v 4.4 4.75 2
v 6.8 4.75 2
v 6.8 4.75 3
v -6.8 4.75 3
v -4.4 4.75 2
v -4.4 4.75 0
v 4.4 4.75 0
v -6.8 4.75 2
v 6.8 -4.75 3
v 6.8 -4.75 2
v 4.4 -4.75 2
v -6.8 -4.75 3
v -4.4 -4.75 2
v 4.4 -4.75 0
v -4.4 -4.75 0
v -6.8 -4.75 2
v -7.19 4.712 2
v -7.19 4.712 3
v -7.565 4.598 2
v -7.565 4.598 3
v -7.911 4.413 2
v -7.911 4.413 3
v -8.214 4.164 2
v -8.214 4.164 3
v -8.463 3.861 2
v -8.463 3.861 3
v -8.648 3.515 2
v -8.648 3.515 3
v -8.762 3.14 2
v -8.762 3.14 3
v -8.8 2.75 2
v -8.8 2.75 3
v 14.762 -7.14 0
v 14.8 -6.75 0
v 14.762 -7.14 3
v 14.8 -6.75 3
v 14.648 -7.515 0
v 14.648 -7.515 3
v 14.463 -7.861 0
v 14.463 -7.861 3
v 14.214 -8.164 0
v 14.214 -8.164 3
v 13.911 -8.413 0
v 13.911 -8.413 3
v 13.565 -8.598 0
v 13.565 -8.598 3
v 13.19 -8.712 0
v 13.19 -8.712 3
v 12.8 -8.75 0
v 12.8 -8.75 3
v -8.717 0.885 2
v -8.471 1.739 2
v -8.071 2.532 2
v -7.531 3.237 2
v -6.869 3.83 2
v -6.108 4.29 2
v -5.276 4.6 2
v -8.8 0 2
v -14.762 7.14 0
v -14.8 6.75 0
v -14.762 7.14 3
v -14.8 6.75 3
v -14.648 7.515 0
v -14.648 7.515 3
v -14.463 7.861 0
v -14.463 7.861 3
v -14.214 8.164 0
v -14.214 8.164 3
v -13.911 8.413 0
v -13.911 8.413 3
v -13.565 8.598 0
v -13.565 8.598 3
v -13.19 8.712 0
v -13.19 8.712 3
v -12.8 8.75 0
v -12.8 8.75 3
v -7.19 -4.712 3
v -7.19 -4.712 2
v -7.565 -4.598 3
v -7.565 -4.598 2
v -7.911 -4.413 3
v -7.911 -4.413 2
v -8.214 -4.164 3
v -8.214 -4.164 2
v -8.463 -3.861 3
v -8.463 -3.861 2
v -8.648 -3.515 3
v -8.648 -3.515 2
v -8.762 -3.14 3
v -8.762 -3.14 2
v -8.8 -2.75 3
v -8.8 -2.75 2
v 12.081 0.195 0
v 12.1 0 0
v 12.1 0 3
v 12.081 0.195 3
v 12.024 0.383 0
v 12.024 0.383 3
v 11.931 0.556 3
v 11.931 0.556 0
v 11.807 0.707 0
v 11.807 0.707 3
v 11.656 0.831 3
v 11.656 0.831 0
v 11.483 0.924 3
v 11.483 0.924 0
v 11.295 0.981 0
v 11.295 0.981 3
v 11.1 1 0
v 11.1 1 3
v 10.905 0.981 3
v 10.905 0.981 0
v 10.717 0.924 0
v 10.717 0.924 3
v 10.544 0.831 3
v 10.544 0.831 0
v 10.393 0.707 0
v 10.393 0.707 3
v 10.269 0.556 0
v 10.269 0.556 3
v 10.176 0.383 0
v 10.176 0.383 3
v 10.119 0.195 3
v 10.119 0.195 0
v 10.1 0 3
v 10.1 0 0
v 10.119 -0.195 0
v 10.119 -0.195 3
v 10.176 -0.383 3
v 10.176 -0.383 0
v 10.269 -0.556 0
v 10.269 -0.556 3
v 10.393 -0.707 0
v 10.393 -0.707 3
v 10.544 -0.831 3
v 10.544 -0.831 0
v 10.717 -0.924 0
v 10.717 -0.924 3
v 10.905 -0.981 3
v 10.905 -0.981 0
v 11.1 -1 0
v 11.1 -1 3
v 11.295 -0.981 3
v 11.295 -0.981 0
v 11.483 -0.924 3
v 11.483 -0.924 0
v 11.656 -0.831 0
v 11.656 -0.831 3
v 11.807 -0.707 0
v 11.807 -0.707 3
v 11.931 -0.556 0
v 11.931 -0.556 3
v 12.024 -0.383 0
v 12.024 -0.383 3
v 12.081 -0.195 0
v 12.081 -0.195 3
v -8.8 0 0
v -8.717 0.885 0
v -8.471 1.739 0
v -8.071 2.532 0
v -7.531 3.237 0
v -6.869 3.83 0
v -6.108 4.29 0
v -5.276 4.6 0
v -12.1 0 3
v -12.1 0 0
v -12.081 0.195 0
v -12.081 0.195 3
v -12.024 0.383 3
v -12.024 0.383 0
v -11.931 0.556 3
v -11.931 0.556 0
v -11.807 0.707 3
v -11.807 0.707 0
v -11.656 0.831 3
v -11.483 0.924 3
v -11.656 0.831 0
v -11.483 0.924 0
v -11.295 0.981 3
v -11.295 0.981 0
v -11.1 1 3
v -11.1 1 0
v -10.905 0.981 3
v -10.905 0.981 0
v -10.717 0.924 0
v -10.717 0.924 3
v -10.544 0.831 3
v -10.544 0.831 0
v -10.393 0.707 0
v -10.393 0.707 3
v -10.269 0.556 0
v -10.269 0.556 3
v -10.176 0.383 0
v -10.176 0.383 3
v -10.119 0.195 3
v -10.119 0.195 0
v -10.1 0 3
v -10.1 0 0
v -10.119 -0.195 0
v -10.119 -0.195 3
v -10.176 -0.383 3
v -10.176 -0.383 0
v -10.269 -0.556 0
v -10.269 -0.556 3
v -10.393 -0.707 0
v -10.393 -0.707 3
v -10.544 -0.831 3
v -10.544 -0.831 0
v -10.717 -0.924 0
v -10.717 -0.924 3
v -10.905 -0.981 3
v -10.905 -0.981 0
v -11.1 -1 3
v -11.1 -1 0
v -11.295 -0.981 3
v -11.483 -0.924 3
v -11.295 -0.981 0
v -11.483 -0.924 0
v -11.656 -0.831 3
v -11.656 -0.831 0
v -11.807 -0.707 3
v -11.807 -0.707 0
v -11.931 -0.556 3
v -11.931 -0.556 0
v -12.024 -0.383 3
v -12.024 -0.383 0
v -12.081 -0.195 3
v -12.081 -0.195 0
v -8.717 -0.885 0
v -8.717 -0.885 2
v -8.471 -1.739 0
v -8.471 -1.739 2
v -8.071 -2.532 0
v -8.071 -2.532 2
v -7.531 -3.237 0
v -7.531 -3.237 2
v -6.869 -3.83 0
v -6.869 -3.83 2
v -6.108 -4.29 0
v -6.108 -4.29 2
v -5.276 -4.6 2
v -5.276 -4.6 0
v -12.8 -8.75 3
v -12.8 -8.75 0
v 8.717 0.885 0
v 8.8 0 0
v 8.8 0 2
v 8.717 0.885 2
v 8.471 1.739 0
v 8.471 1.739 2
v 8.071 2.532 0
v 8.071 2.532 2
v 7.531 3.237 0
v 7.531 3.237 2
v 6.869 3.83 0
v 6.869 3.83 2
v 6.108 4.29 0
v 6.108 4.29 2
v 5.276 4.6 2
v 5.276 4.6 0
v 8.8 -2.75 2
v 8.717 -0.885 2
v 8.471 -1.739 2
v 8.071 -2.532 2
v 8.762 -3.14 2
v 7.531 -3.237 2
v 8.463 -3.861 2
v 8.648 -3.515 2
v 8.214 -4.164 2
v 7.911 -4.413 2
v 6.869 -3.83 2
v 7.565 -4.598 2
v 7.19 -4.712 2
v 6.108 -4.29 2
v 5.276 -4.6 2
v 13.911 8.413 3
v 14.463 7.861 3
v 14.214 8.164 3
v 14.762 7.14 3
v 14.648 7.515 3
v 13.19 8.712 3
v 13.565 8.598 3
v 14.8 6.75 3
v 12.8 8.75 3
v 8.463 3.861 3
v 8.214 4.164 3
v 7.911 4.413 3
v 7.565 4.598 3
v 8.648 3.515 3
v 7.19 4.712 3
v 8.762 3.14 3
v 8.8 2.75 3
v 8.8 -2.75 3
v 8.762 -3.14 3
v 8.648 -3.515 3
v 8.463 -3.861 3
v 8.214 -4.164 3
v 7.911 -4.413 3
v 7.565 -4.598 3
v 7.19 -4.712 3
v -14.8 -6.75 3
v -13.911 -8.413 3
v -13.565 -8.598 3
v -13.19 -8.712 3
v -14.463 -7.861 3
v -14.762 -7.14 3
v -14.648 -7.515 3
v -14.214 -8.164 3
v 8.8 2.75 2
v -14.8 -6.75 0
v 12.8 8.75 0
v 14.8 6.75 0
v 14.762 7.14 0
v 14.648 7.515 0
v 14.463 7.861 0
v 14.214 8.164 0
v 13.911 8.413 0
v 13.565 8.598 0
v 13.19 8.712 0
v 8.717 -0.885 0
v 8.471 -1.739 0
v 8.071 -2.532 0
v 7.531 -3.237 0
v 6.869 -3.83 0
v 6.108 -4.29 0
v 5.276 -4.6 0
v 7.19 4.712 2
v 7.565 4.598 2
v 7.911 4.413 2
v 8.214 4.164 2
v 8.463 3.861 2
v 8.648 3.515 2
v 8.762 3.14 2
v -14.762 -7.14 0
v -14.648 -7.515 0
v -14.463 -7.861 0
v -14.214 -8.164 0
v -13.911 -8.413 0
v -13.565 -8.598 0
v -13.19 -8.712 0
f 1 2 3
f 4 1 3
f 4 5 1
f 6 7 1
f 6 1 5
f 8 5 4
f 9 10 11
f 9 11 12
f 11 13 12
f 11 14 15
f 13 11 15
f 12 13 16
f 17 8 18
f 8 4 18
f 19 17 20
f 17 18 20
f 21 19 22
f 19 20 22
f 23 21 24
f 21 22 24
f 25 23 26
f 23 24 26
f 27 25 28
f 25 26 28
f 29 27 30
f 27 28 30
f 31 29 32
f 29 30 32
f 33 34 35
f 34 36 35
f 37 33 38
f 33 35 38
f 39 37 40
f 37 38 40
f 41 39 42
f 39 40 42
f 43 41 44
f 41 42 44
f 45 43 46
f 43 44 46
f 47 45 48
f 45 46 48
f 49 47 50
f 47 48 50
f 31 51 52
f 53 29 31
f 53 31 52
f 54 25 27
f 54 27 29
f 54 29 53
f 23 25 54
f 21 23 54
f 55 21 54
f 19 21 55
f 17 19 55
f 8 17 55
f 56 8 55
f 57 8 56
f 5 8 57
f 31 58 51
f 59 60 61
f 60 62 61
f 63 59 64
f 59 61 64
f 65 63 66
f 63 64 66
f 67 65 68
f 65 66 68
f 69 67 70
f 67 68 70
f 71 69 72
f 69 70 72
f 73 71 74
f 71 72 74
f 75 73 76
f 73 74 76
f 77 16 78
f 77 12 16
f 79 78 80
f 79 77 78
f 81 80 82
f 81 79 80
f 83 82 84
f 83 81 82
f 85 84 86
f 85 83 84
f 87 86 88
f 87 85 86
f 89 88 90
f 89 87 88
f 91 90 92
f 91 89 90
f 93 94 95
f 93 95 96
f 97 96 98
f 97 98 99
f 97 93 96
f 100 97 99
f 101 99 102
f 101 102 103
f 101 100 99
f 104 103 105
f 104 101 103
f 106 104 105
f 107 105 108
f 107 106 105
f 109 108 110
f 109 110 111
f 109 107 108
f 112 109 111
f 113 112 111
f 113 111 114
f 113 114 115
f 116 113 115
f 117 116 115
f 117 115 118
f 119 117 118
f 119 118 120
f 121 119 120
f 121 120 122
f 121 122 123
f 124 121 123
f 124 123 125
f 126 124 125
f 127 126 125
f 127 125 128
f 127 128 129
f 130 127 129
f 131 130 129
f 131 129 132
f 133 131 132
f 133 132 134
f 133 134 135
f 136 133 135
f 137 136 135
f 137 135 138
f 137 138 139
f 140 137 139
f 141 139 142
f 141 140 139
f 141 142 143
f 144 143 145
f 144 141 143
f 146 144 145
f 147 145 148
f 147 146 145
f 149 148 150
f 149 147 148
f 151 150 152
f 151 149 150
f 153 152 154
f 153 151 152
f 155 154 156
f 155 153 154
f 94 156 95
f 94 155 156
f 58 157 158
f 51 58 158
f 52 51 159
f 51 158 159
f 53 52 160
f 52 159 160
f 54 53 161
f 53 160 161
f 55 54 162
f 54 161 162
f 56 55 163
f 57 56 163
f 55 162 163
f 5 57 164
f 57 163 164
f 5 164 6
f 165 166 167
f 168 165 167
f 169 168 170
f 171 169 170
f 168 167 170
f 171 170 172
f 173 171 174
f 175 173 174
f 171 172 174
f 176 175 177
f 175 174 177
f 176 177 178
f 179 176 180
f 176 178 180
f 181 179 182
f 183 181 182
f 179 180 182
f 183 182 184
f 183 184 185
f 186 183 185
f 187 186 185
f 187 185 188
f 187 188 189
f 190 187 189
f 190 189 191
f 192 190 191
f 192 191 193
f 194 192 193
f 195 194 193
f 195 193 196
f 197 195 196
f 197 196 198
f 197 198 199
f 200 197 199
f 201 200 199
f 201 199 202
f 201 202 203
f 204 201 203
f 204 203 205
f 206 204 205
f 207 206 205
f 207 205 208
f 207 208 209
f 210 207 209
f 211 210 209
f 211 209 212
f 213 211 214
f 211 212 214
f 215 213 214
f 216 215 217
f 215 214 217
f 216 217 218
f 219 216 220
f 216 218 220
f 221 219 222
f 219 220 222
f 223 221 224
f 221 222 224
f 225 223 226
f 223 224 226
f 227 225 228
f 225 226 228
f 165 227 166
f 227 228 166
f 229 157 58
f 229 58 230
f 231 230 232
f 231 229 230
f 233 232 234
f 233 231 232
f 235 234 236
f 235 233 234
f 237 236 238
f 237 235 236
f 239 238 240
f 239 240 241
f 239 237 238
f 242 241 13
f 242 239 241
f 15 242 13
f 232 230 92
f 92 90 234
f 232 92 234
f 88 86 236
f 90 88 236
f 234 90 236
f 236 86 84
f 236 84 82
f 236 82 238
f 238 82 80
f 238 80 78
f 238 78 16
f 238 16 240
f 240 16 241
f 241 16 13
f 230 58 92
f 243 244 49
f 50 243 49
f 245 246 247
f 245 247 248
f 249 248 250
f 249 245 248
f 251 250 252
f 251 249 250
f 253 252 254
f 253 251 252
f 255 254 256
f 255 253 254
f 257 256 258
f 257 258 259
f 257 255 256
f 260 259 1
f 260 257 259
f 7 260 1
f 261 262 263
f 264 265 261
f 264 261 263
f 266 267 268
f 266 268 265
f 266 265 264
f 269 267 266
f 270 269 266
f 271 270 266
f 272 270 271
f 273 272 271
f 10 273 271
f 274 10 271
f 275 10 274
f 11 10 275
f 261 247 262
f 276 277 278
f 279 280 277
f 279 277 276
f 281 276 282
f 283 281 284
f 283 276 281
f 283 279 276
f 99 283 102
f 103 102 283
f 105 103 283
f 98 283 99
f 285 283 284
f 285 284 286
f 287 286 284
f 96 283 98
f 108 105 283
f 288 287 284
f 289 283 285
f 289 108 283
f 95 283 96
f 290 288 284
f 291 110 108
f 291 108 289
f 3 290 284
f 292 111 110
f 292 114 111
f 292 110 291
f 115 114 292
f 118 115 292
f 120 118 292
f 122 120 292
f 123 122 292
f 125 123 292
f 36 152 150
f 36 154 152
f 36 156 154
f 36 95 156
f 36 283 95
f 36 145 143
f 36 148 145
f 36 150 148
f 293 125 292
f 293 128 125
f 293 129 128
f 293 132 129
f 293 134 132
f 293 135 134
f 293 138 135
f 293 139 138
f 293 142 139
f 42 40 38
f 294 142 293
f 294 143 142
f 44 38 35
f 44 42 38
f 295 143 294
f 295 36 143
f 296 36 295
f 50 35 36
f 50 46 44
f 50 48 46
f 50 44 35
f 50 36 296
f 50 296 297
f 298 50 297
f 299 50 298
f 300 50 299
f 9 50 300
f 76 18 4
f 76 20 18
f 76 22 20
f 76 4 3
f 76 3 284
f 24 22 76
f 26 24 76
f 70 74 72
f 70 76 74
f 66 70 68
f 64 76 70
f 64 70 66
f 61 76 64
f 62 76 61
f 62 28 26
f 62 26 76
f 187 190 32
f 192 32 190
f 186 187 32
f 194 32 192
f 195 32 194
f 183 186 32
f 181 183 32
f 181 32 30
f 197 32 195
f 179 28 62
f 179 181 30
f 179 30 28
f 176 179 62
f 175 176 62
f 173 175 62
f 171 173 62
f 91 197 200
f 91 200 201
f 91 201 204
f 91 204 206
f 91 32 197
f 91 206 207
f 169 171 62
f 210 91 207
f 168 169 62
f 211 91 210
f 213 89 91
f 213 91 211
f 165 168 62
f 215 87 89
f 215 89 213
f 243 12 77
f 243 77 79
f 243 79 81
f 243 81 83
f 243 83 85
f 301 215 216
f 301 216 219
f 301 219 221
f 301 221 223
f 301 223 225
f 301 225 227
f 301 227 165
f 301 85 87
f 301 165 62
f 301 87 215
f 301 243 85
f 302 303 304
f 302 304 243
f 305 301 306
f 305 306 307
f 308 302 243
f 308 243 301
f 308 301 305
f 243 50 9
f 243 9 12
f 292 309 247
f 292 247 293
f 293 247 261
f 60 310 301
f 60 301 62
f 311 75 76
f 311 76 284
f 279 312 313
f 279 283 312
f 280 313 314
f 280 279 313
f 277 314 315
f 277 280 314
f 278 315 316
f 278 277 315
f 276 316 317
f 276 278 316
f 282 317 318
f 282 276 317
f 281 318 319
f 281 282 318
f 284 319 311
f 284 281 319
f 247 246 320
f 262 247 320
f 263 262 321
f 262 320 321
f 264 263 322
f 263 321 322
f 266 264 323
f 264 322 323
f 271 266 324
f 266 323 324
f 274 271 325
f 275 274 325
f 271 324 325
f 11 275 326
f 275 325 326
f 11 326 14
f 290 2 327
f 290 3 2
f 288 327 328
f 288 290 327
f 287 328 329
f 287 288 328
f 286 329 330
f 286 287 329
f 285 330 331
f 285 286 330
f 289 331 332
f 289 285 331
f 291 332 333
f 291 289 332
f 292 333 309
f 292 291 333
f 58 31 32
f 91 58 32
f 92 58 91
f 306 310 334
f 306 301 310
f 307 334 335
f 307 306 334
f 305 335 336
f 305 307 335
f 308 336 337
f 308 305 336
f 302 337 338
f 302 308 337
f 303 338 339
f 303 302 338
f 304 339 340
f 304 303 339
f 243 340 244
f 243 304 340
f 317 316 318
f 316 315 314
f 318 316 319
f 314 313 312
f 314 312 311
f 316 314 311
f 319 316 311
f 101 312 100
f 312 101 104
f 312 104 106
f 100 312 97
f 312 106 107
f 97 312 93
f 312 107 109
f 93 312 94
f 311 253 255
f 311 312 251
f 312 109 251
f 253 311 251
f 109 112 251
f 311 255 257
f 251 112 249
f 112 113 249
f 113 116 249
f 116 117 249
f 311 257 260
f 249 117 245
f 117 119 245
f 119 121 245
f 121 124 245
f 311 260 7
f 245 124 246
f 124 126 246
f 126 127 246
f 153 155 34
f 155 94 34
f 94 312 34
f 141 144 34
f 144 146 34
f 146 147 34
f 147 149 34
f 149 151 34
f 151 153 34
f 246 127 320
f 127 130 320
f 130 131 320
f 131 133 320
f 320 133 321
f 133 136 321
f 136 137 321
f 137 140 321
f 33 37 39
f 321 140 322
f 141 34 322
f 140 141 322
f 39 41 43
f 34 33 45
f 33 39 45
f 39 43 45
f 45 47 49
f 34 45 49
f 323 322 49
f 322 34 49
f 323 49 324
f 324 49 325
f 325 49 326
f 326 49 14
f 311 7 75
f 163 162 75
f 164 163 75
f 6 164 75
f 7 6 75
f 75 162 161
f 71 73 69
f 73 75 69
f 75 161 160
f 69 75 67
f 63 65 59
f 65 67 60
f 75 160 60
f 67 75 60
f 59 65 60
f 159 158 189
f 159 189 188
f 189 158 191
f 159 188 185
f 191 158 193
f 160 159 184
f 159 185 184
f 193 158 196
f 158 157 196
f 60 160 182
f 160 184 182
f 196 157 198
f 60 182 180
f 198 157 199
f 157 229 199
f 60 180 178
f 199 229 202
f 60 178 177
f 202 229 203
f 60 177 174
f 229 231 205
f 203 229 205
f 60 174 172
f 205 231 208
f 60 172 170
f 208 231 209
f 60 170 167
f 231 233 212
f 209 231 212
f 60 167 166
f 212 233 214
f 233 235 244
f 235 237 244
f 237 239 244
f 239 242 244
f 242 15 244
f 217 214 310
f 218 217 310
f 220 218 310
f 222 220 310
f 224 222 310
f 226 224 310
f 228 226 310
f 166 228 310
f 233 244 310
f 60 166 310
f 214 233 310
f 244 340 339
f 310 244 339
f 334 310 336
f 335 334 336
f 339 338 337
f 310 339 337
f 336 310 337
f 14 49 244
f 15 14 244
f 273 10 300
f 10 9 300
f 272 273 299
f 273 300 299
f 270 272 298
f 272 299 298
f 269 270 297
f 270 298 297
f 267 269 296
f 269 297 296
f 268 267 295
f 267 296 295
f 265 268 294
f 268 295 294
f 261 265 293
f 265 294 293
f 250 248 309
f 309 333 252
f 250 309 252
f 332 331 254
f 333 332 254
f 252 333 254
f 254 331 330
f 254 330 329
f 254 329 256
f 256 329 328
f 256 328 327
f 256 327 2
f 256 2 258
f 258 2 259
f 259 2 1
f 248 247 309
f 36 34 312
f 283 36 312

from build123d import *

# Parameters (mm, degrees)
F1_DEPTH = 3
F2_DEPTH = 2
F3_R     = 2
F6_D     = 2


# Not quite as in the source:
# - a feature names something its author has since deleted; it is built from what else it names


with BuildPart() as f1:
    # F0 (on Top) → F1 (new body)
    with BuildSketch(Plane.XY):
        Polygon((-4.4, 4.75), (0, 4.75), (0, 8.75), (-14.8, 8.75), (-14.8, 0), (-8.8, 0), (-8.8, 4.75), align=None)
    extrude(amount=F1_DEPTH)

    # F0 (on Top) → F2 (join)
    with BuildSketch(Plane.XY):
        with BuildLine():
            ThreePointArc((-8.8, 0), (-7.5309776981, 3.2373793414), (-4.4, 4.75))
            Line((-4.4, 4.75), (-8.8, 4.75))
            Line((-8.8, 4.75), (-8.8, 0))
        make_face()
    extrude(amount=F2_DEPTH)

    # F3
    f3_edges = [f1.edges().sort_by_distance(p)[0] for p in [
        (-14.8, 8.75, 1.5),
        (-8.8, 4.75, 2.5),
    ]]
    fillet(f3_edges, radius=F3_R)

    # F4: F1 across face


with BuildPart() as f1_1:
    add(f1.part)
    add(f1.part.mirror(Plane(origin=(-11.8, 0, 1.5), x_dir=(1, 0, 0), z_dir=(0, -1, 0))))

    # F6 (through all)
    with Locations(Plane.XY.offset(3)):
        with Locations((-11.1, 0)):
            Hole(F6_D / 2)

    # F7: F1 across face


with BuildPart() as f1_2:
    add(f1_1.part)
    add(f1_1.part.mirror(Plane(origin=(0, 6.75, 1.5), x_dir=(0, 1, 0), z_dir=(1, 0, 0))))


solid = f1_2.part
